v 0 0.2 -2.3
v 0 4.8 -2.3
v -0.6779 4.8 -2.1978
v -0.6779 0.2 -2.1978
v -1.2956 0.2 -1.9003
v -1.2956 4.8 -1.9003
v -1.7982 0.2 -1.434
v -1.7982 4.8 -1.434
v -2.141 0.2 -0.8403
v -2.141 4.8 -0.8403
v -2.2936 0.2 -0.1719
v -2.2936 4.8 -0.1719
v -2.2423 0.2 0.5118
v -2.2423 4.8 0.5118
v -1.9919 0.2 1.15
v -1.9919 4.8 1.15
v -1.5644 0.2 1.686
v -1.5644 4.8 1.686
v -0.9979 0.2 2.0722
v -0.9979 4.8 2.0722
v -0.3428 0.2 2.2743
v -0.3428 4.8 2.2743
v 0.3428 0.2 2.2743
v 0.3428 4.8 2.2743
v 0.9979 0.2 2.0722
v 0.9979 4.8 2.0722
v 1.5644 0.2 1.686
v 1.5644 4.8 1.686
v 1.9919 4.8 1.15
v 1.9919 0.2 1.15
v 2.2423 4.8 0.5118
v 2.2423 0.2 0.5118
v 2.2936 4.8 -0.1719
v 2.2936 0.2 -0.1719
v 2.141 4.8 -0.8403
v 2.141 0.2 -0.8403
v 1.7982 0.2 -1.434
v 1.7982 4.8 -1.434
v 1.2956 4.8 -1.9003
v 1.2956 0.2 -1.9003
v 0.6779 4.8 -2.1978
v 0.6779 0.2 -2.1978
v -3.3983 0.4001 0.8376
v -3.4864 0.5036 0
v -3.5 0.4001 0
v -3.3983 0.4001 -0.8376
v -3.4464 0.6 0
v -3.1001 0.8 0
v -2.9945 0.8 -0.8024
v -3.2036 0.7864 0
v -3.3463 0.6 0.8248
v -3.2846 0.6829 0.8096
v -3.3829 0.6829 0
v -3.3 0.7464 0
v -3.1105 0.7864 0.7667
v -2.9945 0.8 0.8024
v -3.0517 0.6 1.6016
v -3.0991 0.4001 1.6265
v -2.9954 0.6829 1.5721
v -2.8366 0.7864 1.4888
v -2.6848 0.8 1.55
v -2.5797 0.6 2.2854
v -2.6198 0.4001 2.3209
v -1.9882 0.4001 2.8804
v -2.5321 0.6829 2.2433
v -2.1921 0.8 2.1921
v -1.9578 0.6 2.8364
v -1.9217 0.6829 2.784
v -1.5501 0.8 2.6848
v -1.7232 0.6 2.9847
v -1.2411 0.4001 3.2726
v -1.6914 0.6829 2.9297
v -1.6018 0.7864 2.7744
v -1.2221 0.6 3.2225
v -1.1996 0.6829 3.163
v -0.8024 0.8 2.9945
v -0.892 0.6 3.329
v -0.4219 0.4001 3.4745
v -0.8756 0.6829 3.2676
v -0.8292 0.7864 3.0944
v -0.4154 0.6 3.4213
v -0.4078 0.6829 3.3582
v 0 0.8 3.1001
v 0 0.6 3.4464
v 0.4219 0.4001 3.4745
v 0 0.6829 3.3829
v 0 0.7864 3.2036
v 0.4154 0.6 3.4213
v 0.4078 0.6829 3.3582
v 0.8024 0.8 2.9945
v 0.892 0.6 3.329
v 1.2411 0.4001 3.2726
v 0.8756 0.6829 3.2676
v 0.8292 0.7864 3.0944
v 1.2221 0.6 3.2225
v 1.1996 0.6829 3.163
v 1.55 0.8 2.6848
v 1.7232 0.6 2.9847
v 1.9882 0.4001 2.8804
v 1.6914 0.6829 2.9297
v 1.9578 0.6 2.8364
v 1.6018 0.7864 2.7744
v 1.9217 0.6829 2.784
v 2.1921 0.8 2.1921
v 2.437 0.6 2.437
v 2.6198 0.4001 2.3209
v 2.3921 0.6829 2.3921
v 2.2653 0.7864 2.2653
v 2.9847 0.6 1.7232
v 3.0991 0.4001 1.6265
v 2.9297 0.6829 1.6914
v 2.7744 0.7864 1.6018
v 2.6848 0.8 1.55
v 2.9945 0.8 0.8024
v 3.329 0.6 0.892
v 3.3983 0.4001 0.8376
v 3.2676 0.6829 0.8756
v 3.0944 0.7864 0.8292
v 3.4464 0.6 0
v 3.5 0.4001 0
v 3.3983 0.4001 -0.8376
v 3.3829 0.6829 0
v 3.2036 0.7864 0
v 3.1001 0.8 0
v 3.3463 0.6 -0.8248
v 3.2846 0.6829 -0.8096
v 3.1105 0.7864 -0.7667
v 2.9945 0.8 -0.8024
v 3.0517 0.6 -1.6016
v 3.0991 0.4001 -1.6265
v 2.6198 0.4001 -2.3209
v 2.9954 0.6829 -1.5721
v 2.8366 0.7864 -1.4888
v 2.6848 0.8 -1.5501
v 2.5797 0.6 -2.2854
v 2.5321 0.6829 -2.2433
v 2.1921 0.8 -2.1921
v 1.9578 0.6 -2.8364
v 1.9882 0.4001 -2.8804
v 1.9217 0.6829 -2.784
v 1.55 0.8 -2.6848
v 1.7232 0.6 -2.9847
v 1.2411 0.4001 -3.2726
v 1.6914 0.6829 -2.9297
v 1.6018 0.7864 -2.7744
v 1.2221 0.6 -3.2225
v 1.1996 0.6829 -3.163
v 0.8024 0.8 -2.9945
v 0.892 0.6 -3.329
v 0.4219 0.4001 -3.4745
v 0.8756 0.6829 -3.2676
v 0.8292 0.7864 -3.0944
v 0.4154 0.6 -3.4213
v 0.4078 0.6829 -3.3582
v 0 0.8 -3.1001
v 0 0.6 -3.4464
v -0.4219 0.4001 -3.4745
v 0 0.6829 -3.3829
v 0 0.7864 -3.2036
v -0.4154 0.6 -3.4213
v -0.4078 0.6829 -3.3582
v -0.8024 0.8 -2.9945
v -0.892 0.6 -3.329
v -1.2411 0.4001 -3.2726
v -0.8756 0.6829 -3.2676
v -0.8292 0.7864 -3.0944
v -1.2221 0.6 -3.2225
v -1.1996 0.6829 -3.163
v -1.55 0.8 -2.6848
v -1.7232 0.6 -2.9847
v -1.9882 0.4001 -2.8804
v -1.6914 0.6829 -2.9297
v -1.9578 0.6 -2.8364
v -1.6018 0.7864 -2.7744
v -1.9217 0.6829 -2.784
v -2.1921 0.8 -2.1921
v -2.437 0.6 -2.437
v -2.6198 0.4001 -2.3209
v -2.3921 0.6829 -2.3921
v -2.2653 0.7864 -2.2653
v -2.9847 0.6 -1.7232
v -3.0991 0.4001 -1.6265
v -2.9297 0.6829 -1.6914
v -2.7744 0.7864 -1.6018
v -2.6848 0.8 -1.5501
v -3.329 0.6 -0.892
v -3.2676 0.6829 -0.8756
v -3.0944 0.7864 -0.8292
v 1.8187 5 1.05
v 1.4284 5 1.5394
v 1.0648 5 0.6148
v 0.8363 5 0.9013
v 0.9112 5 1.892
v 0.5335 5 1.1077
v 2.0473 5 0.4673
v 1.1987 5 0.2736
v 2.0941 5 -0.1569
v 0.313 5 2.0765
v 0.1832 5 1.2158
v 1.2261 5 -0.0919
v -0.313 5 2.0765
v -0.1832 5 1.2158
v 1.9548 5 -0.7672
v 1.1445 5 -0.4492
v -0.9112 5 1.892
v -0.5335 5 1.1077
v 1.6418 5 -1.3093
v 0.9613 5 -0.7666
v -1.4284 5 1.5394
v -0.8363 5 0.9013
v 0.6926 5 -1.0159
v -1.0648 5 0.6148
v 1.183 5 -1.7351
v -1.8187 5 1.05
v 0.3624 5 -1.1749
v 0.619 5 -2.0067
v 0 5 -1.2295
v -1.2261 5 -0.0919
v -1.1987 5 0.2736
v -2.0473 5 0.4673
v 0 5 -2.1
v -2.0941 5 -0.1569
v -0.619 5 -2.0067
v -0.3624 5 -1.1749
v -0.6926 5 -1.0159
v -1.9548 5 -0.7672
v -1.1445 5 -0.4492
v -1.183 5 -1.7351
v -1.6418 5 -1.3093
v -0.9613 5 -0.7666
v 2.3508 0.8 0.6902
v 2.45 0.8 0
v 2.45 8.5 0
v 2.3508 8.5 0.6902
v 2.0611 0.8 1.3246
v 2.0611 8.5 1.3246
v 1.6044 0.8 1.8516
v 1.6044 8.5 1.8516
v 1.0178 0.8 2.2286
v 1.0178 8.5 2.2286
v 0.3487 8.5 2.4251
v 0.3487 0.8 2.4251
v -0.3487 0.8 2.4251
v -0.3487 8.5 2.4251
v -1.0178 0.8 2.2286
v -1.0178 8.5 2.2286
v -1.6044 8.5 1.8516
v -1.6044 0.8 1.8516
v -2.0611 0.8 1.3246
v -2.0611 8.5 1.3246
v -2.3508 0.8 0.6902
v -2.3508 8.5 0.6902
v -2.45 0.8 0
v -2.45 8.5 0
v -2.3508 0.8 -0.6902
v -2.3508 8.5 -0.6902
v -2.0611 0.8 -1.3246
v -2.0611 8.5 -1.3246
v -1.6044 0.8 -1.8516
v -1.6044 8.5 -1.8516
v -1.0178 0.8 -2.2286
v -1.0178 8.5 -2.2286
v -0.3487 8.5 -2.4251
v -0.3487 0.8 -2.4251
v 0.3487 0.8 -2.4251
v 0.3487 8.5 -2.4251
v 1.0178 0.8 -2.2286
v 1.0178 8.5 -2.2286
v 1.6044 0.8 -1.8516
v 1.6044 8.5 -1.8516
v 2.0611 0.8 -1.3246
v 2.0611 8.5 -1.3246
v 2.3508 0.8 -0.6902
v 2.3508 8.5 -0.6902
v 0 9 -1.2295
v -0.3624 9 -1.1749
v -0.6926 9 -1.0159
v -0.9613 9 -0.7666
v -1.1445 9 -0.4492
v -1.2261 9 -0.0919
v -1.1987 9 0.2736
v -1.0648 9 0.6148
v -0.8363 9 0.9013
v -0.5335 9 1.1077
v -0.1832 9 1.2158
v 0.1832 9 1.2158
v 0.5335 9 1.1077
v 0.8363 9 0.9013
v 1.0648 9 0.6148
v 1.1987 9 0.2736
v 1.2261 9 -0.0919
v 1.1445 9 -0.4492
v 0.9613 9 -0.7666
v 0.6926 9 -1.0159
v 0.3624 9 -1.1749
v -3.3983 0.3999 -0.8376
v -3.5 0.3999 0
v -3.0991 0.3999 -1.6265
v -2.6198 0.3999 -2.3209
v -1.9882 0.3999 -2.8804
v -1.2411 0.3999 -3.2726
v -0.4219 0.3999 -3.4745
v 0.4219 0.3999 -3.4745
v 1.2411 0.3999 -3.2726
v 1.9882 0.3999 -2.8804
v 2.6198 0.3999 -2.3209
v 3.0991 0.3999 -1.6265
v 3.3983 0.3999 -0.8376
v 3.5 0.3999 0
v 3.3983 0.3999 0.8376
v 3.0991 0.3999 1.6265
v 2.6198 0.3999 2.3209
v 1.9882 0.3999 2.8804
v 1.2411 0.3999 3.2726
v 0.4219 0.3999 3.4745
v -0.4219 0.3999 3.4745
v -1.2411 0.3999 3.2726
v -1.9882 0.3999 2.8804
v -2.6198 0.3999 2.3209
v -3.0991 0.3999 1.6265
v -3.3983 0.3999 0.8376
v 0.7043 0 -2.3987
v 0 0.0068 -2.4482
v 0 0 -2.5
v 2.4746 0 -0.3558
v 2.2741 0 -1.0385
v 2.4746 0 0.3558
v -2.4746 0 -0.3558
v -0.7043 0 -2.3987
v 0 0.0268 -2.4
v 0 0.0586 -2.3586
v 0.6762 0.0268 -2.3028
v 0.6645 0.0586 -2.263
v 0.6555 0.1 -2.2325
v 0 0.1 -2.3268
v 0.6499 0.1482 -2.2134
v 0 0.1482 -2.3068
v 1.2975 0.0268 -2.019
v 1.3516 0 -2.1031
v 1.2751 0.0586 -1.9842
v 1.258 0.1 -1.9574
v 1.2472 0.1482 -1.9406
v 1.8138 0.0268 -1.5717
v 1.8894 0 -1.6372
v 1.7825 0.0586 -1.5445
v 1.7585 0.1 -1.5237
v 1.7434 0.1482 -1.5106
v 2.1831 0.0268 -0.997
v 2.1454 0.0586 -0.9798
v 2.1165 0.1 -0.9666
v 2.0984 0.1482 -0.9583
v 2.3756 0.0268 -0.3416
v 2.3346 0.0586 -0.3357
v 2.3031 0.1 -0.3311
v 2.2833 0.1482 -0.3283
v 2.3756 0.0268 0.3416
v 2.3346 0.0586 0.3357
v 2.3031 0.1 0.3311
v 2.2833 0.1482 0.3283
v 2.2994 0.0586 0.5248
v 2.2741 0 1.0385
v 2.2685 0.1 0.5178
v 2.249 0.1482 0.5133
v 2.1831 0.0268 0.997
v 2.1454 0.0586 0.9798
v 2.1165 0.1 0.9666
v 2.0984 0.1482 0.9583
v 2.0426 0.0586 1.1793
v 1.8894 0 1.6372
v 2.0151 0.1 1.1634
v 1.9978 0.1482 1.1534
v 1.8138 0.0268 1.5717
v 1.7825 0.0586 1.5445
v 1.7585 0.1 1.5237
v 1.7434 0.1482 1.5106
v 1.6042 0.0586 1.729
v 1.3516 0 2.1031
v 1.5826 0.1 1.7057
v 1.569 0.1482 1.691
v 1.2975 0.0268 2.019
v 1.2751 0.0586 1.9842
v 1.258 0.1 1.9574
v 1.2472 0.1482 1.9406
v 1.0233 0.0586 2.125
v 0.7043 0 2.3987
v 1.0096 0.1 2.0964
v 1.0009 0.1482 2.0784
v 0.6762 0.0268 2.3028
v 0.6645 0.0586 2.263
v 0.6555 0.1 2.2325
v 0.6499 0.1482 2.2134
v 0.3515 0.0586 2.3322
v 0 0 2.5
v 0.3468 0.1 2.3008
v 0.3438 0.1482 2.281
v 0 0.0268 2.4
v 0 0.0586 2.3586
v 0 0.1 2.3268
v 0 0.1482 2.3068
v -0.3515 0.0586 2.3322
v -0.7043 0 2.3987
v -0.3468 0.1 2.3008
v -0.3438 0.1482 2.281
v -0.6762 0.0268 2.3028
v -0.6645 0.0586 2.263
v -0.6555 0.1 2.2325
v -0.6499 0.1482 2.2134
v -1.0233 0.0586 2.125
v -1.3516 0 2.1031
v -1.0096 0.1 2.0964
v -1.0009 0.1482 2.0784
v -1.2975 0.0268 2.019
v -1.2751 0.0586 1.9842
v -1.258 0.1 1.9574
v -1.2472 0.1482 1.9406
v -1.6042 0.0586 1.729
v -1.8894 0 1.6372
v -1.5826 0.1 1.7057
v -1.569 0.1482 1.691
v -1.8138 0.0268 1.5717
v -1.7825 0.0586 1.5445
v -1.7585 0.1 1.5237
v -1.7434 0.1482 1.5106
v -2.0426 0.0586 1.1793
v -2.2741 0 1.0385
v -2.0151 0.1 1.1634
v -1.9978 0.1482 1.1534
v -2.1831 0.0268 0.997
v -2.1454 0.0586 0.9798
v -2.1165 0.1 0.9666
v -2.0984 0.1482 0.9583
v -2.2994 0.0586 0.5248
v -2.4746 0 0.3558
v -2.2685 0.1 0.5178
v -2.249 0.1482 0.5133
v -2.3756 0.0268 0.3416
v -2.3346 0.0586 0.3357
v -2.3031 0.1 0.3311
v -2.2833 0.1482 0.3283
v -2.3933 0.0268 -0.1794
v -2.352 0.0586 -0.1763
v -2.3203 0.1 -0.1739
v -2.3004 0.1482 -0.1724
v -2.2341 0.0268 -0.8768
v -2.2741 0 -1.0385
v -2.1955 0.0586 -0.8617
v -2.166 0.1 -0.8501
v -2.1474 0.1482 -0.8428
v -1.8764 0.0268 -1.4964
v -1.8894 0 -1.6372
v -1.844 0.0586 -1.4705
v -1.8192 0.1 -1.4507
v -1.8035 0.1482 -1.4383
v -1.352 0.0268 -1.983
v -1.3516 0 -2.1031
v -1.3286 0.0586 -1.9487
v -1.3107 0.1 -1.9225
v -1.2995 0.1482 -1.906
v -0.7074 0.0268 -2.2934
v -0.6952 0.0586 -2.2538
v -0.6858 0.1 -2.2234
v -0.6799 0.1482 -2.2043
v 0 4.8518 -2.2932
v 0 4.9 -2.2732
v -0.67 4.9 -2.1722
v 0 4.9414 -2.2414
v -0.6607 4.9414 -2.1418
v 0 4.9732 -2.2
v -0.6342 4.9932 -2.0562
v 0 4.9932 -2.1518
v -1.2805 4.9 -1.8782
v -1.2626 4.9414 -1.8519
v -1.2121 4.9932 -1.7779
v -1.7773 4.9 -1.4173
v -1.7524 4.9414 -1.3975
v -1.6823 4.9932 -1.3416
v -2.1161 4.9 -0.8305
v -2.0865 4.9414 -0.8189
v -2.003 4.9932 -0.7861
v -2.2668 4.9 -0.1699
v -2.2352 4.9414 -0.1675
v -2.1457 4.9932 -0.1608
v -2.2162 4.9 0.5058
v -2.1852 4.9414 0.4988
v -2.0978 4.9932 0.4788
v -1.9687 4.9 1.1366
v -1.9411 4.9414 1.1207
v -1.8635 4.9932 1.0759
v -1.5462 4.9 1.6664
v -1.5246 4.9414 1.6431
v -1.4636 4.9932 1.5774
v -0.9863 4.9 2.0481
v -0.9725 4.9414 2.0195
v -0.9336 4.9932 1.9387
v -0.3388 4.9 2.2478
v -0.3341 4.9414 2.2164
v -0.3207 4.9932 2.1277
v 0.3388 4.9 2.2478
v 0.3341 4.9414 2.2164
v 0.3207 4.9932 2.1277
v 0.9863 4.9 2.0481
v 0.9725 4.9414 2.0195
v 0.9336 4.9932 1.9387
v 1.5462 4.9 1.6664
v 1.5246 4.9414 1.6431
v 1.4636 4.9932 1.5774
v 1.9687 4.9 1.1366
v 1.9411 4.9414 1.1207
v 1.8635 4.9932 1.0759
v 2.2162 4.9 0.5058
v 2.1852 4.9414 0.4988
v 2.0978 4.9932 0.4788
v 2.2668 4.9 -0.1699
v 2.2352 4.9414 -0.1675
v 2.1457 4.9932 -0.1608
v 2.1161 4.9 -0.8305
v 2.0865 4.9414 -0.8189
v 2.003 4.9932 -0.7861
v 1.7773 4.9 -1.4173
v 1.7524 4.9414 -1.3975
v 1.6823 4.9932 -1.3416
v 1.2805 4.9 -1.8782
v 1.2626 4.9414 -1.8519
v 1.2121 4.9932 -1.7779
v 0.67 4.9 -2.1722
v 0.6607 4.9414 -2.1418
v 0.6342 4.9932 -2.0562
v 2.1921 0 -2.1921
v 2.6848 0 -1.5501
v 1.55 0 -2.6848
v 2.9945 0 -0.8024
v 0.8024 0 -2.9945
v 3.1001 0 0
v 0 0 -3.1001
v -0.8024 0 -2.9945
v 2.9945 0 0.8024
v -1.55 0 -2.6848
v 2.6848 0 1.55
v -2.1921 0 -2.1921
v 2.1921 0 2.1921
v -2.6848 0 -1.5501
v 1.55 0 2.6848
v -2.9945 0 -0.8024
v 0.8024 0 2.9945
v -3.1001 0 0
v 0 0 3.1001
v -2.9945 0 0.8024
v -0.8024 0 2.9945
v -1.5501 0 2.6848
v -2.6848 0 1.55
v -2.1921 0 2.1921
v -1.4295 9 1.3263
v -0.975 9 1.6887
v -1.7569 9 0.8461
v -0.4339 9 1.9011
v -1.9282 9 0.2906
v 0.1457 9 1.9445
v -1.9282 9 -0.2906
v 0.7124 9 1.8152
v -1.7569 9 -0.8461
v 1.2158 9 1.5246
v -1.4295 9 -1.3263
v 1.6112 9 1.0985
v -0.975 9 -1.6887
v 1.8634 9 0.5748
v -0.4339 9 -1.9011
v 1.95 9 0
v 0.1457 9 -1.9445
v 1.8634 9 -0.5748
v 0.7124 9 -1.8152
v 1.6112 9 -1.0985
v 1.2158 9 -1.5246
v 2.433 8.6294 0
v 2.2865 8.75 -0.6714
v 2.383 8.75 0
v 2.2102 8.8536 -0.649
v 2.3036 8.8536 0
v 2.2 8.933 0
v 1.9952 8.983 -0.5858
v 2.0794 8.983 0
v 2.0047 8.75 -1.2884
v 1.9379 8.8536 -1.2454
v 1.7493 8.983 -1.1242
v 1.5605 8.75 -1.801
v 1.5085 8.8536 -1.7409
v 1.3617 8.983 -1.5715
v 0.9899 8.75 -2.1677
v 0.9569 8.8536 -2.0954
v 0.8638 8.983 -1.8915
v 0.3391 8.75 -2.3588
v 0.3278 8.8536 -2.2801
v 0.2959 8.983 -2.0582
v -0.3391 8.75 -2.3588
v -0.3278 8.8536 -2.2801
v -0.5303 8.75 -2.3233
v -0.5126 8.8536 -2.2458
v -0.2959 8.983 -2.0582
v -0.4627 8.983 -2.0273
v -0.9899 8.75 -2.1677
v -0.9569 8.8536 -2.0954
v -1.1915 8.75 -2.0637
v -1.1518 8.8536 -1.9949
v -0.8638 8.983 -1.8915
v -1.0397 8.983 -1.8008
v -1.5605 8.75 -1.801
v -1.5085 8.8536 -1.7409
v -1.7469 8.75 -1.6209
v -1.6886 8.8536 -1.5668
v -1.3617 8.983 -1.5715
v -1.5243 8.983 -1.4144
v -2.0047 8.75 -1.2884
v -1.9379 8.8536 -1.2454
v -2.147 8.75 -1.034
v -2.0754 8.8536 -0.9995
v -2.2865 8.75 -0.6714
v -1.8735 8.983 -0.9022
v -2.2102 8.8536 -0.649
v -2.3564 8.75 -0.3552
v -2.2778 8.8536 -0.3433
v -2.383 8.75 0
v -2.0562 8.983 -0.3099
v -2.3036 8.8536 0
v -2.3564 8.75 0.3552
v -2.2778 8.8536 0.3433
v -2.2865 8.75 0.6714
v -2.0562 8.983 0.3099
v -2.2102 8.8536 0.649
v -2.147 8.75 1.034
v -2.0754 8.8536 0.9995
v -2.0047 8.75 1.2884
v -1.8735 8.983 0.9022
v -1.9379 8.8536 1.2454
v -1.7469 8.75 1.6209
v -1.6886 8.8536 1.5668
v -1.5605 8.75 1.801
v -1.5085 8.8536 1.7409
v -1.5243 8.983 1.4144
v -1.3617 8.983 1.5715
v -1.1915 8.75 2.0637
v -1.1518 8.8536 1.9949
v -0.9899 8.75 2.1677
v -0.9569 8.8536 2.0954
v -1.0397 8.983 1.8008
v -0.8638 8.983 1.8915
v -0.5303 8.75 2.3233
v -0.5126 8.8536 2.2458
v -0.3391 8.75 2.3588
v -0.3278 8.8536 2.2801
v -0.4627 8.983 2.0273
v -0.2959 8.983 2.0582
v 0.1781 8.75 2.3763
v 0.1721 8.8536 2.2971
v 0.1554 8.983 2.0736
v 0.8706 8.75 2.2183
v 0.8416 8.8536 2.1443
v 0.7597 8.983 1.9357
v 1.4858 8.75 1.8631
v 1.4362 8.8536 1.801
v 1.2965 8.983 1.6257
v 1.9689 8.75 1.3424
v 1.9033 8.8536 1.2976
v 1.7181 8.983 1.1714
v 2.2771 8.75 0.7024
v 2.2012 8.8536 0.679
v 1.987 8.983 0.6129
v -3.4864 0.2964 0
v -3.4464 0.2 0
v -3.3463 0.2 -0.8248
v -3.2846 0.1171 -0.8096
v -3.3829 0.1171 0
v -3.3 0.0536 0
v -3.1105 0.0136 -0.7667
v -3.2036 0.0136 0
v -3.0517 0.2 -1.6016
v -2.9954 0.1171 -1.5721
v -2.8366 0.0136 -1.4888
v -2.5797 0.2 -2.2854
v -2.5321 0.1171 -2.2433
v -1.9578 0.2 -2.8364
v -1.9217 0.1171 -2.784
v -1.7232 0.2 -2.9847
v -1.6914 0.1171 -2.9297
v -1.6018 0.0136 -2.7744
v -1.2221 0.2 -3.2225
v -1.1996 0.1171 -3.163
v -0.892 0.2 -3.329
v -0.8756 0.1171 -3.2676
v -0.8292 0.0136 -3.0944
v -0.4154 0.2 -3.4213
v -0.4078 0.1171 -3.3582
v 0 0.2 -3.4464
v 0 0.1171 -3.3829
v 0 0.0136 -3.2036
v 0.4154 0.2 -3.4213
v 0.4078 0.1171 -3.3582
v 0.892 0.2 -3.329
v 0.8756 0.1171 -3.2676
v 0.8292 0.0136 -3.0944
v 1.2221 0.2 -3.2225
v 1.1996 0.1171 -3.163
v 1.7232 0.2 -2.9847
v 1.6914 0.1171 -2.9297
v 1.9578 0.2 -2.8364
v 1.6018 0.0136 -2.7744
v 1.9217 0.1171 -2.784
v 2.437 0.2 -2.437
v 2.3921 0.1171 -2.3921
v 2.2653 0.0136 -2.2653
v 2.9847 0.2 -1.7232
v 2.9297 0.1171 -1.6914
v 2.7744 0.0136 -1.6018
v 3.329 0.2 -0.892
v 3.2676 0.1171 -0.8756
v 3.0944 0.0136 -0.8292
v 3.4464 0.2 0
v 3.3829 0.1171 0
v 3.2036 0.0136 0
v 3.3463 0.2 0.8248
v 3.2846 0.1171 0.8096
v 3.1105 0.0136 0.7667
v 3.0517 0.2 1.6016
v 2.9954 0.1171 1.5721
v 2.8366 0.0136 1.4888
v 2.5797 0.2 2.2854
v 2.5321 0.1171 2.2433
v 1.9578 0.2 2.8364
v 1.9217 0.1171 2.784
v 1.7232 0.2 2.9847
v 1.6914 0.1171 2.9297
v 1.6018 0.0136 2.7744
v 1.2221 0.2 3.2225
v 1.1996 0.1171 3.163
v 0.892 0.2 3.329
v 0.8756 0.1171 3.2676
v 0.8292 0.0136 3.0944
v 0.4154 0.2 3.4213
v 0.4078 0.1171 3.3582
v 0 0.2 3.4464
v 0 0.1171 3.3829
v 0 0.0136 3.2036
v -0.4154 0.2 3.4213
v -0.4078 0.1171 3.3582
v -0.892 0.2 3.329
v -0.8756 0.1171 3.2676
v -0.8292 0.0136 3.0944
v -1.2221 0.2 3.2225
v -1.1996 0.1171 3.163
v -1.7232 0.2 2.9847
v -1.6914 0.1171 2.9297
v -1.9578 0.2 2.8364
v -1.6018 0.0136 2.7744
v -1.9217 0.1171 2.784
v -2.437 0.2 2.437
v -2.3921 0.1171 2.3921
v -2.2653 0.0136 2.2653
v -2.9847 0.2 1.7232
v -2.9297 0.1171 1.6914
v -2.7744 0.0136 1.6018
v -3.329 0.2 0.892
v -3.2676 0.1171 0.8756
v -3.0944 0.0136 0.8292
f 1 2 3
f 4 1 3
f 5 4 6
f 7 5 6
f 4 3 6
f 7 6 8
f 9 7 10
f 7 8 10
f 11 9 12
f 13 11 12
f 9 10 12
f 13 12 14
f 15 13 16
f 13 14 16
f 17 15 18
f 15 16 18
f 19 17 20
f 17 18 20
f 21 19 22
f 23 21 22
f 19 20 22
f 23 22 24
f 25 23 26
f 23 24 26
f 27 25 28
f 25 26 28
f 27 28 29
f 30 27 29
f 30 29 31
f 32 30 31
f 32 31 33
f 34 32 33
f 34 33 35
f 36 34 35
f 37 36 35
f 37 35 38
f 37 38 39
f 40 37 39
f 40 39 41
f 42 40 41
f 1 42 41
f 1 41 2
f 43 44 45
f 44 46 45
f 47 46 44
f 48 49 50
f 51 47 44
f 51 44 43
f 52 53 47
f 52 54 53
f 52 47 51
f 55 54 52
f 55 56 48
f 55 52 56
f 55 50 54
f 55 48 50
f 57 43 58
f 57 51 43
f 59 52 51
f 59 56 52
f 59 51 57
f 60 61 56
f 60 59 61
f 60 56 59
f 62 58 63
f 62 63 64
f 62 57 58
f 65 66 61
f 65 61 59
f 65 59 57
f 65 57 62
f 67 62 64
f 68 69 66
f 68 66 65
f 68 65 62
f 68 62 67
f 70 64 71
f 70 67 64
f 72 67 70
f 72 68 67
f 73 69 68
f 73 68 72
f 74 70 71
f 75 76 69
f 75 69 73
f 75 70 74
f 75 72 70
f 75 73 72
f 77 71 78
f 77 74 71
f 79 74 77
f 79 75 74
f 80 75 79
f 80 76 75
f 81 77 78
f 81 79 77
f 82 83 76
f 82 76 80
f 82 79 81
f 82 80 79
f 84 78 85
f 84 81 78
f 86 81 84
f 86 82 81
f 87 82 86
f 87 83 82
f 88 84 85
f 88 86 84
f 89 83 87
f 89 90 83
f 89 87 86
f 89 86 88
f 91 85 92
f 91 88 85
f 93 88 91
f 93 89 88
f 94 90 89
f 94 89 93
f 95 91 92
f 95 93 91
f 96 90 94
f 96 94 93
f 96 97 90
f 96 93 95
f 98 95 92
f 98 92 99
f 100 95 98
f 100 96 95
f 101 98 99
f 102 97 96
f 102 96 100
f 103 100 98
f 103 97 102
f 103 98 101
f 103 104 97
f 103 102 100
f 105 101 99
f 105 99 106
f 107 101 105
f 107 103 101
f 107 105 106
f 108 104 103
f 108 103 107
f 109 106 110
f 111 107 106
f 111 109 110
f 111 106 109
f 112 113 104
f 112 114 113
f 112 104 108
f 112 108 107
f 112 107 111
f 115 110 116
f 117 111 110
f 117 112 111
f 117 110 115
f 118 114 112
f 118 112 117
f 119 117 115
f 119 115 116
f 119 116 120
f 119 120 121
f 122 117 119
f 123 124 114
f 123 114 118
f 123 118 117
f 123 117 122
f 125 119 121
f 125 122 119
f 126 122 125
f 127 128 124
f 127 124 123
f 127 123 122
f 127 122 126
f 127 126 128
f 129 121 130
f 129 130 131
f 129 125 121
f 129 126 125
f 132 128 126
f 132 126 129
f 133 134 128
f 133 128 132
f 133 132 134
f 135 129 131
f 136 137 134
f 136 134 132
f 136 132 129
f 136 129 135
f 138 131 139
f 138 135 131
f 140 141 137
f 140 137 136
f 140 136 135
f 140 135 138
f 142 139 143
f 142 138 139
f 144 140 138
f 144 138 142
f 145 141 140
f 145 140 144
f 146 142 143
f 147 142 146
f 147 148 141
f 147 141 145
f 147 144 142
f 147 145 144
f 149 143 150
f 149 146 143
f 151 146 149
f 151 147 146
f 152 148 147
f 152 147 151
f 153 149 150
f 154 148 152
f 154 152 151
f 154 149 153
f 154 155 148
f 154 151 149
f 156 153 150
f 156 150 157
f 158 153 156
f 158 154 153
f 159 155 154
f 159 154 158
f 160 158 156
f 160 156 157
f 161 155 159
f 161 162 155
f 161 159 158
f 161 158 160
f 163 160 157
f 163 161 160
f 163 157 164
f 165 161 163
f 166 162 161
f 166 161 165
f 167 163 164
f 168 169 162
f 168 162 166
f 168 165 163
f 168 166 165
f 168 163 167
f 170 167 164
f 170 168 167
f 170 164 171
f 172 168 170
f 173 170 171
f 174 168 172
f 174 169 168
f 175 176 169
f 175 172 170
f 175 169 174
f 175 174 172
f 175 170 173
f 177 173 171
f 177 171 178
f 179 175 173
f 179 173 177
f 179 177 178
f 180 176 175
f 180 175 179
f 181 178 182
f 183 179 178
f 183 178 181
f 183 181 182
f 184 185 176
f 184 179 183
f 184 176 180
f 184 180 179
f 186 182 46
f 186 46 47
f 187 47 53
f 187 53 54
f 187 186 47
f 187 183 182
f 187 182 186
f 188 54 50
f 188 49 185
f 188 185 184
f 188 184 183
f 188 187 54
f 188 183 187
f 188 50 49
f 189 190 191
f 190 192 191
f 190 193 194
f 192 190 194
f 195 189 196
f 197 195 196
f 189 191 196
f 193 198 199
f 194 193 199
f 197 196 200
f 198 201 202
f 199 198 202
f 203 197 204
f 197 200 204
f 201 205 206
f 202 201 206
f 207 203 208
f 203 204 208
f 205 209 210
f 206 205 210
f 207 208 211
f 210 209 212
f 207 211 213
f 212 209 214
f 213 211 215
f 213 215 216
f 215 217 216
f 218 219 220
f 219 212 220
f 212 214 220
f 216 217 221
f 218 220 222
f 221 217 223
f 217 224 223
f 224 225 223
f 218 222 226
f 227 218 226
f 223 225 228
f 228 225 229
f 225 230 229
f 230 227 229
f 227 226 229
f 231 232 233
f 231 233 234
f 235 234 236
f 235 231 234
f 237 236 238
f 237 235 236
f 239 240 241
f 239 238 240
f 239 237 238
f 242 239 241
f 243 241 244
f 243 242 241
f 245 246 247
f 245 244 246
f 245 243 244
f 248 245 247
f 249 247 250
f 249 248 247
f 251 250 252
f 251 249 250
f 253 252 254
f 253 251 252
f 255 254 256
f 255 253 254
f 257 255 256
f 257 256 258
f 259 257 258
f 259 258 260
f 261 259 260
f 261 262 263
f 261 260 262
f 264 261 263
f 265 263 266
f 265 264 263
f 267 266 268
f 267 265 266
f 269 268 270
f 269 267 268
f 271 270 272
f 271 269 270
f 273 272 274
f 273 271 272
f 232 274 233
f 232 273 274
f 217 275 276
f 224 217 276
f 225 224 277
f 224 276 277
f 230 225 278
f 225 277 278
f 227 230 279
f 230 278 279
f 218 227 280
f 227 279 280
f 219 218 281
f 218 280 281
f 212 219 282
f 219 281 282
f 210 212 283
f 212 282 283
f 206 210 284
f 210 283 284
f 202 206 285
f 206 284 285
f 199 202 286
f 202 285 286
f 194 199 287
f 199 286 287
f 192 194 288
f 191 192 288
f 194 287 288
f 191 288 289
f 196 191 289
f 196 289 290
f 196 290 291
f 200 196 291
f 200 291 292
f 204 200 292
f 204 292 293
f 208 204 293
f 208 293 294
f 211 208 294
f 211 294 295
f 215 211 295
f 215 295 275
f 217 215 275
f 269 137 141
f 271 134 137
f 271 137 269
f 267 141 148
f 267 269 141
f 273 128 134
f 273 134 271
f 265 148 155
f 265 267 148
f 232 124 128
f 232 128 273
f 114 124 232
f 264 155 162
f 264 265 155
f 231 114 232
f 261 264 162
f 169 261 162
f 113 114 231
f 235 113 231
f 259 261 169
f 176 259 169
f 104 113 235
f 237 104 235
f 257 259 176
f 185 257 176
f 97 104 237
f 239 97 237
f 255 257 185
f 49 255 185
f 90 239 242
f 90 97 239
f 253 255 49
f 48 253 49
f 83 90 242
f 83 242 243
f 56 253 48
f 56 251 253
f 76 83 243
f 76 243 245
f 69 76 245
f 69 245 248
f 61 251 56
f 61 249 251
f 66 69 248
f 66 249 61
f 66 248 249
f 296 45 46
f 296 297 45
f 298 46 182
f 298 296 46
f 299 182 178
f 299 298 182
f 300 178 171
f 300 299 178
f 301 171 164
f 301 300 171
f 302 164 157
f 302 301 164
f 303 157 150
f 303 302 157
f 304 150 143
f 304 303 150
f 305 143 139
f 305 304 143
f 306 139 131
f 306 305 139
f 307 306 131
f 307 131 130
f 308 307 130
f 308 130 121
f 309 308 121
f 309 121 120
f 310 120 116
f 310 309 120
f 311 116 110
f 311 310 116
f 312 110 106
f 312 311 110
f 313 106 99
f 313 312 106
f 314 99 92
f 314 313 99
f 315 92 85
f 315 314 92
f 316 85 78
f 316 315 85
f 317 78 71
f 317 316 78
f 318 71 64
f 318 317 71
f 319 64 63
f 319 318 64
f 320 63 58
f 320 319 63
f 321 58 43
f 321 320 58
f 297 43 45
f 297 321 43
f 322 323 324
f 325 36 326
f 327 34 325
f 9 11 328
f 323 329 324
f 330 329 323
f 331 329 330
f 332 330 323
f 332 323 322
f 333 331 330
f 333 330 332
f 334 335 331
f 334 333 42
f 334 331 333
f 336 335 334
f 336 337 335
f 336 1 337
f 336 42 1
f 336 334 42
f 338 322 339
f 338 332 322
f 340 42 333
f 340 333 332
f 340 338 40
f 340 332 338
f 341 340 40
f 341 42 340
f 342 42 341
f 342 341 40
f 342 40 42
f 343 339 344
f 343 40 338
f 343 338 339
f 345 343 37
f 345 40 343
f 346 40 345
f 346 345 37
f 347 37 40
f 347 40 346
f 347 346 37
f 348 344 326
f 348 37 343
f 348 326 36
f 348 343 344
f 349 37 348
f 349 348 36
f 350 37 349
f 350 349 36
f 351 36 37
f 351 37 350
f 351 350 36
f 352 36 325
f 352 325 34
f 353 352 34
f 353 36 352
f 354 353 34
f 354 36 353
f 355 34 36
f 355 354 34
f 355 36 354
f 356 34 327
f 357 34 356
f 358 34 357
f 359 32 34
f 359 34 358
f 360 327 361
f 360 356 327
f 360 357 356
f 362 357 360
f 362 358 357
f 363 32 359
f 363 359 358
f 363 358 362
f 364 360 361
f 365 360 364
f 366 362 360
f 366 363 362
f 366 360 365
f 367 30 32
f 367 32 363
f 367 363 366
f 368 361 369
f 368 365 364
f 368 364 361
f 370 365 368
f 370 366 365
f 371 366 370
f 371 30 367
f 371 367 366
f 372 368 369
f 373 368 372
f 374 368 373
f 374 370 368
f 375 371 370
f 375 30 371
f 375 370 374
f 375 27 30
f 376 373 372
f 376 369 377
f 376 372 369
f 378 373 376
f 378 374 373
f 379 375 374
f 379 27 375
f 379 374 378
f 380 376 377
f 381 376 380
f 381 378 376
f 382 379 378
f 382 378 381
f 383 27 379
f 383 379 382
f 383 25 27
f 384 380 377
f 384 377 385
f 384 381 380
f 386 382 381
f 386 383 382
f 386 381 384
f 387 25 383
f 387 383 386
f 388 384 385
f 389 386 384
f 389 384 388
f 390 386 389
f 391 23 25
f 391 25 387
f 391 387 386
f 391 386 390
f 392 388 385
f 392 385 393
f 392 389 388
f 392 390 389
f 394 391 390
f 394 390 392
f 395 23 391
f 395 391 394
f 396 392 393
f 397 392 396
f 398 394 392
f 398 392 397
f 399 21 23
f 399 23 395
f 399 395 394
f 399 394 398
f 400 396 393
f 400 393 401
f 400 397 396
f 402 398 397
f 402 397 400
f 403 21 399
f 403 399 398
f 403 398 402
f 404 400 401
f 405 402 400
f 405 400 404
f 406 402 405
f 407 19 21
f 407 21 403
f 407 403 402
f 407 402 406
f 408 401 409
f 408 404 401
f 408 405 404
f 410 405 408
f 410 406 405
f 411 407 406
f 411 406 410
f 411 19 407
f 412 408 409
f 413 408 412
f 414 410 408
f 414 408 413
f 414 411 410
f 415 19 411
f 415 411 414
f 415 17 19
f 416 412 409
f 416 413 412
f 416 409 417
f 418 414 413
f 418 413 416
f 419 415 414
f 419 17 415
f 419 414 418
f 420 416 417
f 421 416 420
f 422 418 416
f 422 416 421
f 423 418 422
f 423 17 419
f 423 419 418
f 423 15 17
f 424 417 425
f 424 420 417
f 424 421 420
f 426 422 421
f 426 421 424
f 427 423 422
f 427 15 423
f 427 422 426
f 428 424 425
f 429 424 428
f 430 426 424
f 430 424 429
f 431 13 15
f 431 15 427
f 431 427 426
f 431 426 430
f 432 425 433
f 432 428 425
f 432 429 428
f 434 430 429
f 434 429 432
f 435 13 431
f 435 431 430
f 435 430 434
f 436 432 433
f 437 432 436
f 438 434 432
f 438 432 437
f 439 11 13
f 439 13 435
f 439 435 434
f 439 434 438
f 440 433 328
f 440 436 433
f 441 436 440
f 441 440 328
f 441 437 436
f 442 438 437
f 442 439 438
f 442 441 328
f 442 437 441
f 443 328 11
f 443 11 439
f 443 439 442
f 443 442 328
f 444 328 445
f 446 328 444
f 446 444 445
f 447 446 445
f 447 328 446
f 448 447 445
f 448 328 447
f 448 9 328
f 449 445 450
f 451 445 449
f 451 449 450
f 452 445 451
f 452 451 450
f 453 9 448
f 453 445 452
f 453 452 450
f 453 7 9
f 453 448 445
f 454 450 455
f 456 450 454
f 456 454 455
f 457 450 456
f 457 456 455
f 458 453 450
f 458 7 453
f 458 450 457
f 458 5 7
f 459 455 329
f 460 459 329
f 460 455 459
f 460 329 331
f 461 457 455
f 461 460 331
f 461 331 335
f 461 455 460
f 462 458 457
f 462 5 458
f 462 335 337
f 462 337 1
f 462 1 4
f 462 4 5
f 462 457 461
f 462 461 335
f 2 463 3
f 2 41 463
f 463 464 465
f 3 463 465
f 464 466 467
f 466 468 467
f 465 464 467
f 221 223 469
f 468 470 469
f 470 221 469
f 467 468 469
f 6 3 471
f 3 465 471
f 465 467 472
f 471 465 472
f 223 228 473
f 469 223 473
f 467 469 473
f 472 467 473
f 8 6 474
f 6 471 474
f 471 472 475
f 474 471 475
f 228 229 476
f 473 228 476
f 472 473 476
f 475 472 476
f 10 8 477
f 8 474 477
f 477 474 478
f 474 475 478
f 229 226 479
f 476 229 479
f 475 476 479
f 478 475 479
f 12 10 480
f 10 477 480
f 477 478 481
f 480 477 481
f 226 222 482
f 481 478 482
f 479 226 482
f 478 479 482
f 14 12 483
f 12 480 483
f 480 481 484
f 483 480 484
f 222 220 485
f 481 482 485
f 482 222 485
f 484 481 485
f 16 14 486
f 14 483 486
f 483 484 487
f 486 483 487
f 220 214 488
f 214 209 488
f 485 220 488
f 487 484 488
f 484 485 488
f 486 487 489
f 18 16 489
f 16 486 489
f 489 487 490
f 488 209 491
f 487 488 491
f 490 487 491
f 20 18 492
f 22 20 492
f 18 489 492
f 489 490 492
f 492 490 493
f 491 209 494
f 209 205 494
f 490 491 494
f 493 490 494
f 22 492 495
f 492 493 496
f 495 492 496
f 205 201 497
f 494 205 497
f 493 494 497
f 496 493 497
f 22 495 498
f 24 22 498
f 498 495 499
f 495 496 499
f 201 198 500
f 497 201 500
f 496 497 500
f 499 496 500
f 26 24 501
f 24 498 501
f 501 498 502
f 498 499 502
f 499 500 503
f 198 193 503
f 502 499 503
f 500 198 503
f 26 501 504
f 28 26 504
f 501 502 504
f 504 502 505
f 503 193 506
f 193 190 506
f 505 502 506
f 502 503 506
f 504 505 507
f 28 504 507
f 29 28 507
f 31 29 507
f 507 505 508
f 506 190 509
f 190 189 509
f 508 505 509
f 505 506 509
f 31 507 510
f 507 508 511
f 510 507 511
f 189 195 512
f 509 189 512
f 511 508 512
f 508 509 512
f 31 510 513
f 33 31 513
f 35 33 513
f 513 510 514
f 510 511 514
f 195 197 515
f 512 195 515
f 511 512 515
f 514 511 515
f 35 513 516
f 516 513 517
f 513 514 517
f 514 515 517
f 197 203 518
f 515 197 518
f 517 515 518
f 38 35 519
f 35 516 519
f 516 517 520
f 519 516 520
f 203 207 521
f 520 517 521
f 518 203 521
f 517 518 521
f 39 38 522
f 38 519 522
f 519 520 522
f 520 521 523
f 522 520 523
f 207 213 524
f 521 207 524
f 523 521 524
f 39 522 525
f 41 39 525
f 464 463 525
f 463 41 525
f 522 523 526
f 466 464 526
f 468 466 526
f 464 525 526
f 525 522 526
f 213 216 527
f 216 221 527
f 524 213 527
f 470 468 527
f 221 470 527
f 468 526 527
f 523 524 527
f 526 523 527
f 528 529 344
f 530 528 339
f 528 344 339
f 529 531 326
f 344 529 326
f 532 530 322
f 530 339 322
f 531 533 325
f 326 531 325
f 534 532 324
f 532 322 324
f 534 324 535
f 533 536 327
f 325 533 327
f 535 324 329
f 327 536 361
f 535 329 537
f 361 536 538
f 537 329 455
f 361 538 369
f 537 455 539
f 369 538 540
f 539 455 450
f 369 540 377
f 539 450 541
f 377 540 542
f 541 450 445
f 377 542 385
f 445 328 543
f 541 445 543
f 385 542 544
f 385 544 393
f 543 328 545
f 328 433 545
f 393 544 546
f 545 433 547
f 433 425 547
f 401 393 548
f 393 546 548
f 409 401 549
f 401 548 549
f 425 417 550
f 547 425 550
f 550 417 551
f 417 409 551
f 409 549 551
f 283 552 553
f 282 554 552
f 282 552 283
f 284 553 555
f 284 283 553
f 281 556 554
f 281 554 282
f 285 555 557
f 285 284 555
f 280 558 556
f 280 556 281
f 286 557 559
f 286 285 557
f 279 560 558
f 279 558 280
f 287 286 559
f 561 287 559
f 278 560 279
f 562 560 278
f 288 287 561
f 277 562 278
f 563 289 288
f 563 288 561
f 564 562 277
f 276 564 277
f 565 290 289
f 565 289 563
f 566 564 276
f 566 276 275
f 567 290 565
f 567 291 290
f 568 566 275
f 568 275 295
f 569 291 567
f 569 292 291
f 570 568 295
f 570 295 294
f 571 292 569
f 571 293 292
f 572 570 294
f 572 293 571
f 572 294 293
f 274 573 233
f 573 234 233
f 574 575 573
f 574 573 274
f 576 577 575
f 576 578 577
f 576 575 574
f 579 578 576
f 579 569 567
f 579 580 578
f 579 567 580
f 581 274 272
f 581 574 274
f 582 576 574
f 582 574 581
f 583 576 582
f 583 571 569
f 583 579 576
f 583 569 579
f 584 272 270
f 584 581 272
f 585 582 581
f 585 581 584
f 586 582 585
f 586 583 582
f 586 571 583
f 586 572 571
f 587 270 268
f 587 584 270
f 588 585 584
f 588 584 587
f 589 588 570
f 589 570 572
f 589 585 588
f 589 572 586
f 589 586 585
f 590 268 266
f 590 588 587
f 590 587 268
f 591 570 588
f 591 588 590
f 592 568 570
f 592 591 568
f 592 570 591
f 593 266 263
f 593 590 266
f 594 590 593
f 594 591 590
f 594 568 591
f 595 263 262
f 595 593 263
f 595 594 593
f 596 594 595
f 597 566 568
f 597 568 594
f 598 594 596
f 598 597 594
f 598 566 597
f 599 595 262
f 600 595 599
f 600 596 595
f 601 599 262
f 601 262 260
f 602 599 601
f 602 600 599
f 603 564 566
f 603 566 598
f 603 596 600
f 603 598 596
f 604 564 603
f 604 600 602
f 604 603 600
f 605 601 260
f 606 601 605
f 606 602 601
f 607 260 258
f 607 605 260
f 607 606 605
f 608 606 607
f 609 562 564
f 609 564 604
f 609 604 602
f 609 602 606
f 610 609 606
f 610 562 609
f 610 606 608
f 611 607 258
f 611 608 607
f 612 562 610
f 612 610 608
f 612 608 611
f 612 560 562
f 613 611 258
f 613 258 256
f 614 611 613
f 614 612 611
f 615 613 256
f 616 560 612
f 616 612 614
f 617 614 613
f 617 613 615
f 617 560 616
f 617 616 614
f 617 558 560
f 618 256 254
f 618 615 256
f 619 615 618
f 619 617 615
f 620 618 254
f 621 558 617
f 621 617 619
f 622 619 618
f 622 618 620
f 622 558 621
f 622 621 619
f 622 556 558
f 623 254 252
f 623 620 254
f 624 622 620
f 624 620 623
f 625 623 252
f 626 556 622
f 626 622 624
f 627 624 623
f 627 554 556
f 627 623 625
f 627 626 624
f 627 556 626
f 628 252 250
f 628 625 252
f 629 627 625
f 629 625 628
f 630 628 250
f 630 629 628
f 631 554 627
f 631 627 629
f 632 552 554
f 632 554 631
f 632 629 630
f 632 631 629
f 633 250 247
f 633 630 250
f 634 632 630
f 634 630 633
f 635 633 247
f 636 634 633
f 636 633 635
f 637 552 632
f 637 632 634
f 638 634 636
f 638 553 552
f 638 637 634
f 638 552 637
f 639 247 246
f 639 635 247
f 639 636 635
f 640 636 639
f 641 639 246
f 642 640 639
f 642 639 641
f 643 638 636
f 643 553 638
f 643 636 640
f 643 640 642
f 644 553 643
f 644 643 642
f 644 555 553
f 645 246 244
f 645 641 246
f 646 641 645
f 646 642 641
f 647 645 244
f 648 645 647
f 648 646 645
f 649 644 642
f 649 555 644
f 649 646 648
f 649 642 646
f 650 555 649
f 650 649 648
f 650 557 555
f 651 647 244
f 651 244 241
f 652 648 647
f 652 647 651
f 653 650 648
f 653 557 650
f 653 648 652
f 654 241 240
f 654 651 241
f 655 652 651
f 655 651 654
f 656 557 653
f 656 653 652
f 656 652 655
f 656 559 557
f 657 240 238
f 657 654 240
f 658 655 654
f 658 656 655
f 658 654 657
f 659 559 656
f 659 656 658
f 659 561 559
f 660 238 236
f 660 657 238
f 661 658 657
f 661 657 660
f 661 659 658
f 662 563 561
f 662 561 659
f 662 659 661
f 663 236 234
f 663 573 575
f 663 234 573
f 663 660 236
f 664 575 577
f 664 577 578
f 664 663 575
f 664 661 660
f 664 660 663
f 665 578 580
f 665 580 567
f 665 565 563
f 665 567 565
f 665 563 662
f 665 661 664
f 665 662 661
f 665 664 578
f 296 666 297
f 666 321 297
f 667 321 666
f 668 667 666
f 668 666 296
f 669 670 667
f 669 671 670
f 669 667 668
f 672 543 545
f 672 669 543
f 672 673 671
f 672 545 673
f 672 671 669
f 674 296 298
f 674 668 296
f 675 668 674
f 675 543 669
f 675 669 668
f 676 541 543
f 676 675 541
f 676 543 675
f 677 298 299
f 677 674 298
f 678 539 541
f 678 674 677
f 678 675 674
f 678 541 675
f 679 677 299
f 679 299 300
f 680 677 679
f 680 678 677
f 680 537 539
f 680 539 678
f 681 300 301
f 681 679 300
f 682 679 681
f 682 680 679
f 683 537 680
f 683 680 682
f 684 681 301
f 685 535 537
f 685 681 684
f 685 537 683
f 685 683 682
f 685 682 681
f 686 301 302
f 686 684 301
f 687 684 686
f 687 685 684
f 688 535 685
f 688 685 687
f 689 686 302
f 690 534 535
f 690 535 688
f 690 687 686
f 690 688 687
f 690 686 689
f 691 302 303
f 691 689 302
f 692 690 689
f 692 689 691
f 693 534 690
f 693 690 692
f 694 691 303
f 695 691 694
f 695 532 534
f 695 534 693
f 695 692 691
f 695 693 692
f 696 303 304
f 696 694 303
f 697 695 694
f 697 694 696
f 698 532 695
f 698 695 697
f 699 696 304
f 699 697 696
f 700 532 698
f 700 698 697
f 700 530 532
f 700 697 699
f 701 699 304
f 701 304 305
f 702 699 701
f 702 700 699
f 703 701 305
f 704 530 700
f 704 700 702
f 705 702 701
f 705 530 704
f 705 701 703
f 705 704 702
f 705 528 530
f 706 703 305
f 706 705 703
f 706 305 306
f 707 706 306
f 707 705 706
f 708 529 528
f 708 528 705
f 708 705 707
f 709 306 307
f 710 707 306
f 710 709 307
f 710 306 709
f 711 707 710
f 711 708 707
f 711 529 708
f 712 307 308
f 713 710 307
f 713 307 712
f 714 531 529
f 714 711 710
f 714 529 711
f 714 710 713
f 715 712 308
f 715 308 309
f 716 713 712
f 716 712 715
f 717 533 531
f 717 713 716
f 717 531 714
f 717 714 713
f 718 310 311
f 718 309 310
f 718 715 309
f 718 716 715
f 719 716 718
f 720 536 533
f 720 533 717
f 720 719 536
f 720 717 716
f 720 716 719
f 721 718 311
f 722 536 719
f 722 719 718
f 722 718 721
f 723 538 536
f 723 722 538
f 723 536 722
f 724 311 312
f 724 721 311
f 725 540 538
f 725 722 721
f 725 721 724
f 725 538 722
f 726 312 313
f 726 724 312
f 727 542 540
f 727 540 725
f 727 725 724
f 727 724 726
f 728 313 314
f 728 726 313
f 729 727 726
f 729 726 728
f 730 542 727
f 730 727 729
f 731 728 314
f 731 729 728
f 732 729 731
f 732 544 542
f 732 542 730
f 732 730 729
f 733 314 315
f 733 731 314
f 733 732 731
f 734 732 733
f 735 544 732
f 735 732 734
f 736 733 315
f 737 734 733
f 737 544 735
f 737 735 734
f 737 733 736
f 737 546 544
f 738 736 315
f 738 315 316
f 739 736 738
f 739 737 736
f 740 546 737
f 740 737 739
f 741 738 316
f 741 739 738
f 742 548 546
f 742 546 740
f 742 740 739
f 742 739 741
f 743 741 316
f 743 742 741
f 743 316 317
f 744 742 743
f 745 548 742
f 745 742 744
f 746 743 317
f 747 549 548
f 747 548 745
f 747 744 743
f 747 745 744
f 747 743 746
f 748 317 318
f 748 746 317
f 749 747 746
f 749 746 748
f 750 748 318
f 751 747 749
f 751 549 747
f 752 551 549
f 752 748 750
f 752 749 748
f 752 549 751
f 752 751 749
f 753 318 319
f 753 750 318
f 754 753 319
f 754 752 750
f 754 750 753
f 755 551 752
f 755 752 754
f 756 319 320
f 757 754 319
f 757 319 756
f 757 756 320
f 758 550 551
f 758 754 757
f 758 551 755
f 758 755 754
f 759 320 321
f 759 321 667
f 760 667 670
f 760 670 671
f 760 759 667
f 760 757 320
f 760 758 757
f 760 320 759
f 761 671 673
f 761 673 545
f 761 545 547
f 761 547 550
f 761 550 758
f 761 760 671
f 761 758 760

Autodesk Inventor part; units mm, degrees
ref_plane "YZ Plane" through (0, 0, 0) normal (1, 0, 0) x (0, 1, 0)
ref_plane "XZ Plane" through (0, 0, 0) normal (0, 1, 0) x (-1, 0, 0)
ref_plane "XY Plane" through (0, 0, 0) normal (0, 0, 1) x (1, 0, 0)
sketch "スケッチ1" plane through (0, 0, 0) normal (0, 1, 0) x (-1, 0, 0)
  circle A0 centre (0, 0) radius 3.5
  dimension "d0" = 7
extrude "押し出し1" add sketch "スケッチ1" along normal blind 0.8
sketch "スケッチ2" plane through (0, 0.8, 0) normal (0, 1, 0) x (1, 0, 0)
  circle A0 centre (0, 0) radius 2.45
  dimension "d3" = 4.9
extrude "押し出し2" add sketch "スケッチ2" along normal blind 8.2
fillet "フィレット1" radius 0.4 2 edges at (3.5, 0, 0) (3.5, 0.8, 0)
sketch "スケッチ3" plane through (0, 0, 0) normal (0, -1, 0) x (1, 0, 0)
  point P0 (0, 0)
  point P1 (0, 0)
hole "穴1" at (0, 0, 0) direction (0, 1, 0) diameter 2.459 end through all counterbore diameter 4.6 counterbore depth 5 thread size "M3x0.5" class "6H" standard "ISO Metric profile"
fillet "フィレット2" radius 0.2 2 edges at (0, 0, 2.3) (0, 5, 2.3)
fillet "フィレット2" radius 0.5 1 edges at (-2.45, 9, 0)
properties part number "M3-RivetNut"
